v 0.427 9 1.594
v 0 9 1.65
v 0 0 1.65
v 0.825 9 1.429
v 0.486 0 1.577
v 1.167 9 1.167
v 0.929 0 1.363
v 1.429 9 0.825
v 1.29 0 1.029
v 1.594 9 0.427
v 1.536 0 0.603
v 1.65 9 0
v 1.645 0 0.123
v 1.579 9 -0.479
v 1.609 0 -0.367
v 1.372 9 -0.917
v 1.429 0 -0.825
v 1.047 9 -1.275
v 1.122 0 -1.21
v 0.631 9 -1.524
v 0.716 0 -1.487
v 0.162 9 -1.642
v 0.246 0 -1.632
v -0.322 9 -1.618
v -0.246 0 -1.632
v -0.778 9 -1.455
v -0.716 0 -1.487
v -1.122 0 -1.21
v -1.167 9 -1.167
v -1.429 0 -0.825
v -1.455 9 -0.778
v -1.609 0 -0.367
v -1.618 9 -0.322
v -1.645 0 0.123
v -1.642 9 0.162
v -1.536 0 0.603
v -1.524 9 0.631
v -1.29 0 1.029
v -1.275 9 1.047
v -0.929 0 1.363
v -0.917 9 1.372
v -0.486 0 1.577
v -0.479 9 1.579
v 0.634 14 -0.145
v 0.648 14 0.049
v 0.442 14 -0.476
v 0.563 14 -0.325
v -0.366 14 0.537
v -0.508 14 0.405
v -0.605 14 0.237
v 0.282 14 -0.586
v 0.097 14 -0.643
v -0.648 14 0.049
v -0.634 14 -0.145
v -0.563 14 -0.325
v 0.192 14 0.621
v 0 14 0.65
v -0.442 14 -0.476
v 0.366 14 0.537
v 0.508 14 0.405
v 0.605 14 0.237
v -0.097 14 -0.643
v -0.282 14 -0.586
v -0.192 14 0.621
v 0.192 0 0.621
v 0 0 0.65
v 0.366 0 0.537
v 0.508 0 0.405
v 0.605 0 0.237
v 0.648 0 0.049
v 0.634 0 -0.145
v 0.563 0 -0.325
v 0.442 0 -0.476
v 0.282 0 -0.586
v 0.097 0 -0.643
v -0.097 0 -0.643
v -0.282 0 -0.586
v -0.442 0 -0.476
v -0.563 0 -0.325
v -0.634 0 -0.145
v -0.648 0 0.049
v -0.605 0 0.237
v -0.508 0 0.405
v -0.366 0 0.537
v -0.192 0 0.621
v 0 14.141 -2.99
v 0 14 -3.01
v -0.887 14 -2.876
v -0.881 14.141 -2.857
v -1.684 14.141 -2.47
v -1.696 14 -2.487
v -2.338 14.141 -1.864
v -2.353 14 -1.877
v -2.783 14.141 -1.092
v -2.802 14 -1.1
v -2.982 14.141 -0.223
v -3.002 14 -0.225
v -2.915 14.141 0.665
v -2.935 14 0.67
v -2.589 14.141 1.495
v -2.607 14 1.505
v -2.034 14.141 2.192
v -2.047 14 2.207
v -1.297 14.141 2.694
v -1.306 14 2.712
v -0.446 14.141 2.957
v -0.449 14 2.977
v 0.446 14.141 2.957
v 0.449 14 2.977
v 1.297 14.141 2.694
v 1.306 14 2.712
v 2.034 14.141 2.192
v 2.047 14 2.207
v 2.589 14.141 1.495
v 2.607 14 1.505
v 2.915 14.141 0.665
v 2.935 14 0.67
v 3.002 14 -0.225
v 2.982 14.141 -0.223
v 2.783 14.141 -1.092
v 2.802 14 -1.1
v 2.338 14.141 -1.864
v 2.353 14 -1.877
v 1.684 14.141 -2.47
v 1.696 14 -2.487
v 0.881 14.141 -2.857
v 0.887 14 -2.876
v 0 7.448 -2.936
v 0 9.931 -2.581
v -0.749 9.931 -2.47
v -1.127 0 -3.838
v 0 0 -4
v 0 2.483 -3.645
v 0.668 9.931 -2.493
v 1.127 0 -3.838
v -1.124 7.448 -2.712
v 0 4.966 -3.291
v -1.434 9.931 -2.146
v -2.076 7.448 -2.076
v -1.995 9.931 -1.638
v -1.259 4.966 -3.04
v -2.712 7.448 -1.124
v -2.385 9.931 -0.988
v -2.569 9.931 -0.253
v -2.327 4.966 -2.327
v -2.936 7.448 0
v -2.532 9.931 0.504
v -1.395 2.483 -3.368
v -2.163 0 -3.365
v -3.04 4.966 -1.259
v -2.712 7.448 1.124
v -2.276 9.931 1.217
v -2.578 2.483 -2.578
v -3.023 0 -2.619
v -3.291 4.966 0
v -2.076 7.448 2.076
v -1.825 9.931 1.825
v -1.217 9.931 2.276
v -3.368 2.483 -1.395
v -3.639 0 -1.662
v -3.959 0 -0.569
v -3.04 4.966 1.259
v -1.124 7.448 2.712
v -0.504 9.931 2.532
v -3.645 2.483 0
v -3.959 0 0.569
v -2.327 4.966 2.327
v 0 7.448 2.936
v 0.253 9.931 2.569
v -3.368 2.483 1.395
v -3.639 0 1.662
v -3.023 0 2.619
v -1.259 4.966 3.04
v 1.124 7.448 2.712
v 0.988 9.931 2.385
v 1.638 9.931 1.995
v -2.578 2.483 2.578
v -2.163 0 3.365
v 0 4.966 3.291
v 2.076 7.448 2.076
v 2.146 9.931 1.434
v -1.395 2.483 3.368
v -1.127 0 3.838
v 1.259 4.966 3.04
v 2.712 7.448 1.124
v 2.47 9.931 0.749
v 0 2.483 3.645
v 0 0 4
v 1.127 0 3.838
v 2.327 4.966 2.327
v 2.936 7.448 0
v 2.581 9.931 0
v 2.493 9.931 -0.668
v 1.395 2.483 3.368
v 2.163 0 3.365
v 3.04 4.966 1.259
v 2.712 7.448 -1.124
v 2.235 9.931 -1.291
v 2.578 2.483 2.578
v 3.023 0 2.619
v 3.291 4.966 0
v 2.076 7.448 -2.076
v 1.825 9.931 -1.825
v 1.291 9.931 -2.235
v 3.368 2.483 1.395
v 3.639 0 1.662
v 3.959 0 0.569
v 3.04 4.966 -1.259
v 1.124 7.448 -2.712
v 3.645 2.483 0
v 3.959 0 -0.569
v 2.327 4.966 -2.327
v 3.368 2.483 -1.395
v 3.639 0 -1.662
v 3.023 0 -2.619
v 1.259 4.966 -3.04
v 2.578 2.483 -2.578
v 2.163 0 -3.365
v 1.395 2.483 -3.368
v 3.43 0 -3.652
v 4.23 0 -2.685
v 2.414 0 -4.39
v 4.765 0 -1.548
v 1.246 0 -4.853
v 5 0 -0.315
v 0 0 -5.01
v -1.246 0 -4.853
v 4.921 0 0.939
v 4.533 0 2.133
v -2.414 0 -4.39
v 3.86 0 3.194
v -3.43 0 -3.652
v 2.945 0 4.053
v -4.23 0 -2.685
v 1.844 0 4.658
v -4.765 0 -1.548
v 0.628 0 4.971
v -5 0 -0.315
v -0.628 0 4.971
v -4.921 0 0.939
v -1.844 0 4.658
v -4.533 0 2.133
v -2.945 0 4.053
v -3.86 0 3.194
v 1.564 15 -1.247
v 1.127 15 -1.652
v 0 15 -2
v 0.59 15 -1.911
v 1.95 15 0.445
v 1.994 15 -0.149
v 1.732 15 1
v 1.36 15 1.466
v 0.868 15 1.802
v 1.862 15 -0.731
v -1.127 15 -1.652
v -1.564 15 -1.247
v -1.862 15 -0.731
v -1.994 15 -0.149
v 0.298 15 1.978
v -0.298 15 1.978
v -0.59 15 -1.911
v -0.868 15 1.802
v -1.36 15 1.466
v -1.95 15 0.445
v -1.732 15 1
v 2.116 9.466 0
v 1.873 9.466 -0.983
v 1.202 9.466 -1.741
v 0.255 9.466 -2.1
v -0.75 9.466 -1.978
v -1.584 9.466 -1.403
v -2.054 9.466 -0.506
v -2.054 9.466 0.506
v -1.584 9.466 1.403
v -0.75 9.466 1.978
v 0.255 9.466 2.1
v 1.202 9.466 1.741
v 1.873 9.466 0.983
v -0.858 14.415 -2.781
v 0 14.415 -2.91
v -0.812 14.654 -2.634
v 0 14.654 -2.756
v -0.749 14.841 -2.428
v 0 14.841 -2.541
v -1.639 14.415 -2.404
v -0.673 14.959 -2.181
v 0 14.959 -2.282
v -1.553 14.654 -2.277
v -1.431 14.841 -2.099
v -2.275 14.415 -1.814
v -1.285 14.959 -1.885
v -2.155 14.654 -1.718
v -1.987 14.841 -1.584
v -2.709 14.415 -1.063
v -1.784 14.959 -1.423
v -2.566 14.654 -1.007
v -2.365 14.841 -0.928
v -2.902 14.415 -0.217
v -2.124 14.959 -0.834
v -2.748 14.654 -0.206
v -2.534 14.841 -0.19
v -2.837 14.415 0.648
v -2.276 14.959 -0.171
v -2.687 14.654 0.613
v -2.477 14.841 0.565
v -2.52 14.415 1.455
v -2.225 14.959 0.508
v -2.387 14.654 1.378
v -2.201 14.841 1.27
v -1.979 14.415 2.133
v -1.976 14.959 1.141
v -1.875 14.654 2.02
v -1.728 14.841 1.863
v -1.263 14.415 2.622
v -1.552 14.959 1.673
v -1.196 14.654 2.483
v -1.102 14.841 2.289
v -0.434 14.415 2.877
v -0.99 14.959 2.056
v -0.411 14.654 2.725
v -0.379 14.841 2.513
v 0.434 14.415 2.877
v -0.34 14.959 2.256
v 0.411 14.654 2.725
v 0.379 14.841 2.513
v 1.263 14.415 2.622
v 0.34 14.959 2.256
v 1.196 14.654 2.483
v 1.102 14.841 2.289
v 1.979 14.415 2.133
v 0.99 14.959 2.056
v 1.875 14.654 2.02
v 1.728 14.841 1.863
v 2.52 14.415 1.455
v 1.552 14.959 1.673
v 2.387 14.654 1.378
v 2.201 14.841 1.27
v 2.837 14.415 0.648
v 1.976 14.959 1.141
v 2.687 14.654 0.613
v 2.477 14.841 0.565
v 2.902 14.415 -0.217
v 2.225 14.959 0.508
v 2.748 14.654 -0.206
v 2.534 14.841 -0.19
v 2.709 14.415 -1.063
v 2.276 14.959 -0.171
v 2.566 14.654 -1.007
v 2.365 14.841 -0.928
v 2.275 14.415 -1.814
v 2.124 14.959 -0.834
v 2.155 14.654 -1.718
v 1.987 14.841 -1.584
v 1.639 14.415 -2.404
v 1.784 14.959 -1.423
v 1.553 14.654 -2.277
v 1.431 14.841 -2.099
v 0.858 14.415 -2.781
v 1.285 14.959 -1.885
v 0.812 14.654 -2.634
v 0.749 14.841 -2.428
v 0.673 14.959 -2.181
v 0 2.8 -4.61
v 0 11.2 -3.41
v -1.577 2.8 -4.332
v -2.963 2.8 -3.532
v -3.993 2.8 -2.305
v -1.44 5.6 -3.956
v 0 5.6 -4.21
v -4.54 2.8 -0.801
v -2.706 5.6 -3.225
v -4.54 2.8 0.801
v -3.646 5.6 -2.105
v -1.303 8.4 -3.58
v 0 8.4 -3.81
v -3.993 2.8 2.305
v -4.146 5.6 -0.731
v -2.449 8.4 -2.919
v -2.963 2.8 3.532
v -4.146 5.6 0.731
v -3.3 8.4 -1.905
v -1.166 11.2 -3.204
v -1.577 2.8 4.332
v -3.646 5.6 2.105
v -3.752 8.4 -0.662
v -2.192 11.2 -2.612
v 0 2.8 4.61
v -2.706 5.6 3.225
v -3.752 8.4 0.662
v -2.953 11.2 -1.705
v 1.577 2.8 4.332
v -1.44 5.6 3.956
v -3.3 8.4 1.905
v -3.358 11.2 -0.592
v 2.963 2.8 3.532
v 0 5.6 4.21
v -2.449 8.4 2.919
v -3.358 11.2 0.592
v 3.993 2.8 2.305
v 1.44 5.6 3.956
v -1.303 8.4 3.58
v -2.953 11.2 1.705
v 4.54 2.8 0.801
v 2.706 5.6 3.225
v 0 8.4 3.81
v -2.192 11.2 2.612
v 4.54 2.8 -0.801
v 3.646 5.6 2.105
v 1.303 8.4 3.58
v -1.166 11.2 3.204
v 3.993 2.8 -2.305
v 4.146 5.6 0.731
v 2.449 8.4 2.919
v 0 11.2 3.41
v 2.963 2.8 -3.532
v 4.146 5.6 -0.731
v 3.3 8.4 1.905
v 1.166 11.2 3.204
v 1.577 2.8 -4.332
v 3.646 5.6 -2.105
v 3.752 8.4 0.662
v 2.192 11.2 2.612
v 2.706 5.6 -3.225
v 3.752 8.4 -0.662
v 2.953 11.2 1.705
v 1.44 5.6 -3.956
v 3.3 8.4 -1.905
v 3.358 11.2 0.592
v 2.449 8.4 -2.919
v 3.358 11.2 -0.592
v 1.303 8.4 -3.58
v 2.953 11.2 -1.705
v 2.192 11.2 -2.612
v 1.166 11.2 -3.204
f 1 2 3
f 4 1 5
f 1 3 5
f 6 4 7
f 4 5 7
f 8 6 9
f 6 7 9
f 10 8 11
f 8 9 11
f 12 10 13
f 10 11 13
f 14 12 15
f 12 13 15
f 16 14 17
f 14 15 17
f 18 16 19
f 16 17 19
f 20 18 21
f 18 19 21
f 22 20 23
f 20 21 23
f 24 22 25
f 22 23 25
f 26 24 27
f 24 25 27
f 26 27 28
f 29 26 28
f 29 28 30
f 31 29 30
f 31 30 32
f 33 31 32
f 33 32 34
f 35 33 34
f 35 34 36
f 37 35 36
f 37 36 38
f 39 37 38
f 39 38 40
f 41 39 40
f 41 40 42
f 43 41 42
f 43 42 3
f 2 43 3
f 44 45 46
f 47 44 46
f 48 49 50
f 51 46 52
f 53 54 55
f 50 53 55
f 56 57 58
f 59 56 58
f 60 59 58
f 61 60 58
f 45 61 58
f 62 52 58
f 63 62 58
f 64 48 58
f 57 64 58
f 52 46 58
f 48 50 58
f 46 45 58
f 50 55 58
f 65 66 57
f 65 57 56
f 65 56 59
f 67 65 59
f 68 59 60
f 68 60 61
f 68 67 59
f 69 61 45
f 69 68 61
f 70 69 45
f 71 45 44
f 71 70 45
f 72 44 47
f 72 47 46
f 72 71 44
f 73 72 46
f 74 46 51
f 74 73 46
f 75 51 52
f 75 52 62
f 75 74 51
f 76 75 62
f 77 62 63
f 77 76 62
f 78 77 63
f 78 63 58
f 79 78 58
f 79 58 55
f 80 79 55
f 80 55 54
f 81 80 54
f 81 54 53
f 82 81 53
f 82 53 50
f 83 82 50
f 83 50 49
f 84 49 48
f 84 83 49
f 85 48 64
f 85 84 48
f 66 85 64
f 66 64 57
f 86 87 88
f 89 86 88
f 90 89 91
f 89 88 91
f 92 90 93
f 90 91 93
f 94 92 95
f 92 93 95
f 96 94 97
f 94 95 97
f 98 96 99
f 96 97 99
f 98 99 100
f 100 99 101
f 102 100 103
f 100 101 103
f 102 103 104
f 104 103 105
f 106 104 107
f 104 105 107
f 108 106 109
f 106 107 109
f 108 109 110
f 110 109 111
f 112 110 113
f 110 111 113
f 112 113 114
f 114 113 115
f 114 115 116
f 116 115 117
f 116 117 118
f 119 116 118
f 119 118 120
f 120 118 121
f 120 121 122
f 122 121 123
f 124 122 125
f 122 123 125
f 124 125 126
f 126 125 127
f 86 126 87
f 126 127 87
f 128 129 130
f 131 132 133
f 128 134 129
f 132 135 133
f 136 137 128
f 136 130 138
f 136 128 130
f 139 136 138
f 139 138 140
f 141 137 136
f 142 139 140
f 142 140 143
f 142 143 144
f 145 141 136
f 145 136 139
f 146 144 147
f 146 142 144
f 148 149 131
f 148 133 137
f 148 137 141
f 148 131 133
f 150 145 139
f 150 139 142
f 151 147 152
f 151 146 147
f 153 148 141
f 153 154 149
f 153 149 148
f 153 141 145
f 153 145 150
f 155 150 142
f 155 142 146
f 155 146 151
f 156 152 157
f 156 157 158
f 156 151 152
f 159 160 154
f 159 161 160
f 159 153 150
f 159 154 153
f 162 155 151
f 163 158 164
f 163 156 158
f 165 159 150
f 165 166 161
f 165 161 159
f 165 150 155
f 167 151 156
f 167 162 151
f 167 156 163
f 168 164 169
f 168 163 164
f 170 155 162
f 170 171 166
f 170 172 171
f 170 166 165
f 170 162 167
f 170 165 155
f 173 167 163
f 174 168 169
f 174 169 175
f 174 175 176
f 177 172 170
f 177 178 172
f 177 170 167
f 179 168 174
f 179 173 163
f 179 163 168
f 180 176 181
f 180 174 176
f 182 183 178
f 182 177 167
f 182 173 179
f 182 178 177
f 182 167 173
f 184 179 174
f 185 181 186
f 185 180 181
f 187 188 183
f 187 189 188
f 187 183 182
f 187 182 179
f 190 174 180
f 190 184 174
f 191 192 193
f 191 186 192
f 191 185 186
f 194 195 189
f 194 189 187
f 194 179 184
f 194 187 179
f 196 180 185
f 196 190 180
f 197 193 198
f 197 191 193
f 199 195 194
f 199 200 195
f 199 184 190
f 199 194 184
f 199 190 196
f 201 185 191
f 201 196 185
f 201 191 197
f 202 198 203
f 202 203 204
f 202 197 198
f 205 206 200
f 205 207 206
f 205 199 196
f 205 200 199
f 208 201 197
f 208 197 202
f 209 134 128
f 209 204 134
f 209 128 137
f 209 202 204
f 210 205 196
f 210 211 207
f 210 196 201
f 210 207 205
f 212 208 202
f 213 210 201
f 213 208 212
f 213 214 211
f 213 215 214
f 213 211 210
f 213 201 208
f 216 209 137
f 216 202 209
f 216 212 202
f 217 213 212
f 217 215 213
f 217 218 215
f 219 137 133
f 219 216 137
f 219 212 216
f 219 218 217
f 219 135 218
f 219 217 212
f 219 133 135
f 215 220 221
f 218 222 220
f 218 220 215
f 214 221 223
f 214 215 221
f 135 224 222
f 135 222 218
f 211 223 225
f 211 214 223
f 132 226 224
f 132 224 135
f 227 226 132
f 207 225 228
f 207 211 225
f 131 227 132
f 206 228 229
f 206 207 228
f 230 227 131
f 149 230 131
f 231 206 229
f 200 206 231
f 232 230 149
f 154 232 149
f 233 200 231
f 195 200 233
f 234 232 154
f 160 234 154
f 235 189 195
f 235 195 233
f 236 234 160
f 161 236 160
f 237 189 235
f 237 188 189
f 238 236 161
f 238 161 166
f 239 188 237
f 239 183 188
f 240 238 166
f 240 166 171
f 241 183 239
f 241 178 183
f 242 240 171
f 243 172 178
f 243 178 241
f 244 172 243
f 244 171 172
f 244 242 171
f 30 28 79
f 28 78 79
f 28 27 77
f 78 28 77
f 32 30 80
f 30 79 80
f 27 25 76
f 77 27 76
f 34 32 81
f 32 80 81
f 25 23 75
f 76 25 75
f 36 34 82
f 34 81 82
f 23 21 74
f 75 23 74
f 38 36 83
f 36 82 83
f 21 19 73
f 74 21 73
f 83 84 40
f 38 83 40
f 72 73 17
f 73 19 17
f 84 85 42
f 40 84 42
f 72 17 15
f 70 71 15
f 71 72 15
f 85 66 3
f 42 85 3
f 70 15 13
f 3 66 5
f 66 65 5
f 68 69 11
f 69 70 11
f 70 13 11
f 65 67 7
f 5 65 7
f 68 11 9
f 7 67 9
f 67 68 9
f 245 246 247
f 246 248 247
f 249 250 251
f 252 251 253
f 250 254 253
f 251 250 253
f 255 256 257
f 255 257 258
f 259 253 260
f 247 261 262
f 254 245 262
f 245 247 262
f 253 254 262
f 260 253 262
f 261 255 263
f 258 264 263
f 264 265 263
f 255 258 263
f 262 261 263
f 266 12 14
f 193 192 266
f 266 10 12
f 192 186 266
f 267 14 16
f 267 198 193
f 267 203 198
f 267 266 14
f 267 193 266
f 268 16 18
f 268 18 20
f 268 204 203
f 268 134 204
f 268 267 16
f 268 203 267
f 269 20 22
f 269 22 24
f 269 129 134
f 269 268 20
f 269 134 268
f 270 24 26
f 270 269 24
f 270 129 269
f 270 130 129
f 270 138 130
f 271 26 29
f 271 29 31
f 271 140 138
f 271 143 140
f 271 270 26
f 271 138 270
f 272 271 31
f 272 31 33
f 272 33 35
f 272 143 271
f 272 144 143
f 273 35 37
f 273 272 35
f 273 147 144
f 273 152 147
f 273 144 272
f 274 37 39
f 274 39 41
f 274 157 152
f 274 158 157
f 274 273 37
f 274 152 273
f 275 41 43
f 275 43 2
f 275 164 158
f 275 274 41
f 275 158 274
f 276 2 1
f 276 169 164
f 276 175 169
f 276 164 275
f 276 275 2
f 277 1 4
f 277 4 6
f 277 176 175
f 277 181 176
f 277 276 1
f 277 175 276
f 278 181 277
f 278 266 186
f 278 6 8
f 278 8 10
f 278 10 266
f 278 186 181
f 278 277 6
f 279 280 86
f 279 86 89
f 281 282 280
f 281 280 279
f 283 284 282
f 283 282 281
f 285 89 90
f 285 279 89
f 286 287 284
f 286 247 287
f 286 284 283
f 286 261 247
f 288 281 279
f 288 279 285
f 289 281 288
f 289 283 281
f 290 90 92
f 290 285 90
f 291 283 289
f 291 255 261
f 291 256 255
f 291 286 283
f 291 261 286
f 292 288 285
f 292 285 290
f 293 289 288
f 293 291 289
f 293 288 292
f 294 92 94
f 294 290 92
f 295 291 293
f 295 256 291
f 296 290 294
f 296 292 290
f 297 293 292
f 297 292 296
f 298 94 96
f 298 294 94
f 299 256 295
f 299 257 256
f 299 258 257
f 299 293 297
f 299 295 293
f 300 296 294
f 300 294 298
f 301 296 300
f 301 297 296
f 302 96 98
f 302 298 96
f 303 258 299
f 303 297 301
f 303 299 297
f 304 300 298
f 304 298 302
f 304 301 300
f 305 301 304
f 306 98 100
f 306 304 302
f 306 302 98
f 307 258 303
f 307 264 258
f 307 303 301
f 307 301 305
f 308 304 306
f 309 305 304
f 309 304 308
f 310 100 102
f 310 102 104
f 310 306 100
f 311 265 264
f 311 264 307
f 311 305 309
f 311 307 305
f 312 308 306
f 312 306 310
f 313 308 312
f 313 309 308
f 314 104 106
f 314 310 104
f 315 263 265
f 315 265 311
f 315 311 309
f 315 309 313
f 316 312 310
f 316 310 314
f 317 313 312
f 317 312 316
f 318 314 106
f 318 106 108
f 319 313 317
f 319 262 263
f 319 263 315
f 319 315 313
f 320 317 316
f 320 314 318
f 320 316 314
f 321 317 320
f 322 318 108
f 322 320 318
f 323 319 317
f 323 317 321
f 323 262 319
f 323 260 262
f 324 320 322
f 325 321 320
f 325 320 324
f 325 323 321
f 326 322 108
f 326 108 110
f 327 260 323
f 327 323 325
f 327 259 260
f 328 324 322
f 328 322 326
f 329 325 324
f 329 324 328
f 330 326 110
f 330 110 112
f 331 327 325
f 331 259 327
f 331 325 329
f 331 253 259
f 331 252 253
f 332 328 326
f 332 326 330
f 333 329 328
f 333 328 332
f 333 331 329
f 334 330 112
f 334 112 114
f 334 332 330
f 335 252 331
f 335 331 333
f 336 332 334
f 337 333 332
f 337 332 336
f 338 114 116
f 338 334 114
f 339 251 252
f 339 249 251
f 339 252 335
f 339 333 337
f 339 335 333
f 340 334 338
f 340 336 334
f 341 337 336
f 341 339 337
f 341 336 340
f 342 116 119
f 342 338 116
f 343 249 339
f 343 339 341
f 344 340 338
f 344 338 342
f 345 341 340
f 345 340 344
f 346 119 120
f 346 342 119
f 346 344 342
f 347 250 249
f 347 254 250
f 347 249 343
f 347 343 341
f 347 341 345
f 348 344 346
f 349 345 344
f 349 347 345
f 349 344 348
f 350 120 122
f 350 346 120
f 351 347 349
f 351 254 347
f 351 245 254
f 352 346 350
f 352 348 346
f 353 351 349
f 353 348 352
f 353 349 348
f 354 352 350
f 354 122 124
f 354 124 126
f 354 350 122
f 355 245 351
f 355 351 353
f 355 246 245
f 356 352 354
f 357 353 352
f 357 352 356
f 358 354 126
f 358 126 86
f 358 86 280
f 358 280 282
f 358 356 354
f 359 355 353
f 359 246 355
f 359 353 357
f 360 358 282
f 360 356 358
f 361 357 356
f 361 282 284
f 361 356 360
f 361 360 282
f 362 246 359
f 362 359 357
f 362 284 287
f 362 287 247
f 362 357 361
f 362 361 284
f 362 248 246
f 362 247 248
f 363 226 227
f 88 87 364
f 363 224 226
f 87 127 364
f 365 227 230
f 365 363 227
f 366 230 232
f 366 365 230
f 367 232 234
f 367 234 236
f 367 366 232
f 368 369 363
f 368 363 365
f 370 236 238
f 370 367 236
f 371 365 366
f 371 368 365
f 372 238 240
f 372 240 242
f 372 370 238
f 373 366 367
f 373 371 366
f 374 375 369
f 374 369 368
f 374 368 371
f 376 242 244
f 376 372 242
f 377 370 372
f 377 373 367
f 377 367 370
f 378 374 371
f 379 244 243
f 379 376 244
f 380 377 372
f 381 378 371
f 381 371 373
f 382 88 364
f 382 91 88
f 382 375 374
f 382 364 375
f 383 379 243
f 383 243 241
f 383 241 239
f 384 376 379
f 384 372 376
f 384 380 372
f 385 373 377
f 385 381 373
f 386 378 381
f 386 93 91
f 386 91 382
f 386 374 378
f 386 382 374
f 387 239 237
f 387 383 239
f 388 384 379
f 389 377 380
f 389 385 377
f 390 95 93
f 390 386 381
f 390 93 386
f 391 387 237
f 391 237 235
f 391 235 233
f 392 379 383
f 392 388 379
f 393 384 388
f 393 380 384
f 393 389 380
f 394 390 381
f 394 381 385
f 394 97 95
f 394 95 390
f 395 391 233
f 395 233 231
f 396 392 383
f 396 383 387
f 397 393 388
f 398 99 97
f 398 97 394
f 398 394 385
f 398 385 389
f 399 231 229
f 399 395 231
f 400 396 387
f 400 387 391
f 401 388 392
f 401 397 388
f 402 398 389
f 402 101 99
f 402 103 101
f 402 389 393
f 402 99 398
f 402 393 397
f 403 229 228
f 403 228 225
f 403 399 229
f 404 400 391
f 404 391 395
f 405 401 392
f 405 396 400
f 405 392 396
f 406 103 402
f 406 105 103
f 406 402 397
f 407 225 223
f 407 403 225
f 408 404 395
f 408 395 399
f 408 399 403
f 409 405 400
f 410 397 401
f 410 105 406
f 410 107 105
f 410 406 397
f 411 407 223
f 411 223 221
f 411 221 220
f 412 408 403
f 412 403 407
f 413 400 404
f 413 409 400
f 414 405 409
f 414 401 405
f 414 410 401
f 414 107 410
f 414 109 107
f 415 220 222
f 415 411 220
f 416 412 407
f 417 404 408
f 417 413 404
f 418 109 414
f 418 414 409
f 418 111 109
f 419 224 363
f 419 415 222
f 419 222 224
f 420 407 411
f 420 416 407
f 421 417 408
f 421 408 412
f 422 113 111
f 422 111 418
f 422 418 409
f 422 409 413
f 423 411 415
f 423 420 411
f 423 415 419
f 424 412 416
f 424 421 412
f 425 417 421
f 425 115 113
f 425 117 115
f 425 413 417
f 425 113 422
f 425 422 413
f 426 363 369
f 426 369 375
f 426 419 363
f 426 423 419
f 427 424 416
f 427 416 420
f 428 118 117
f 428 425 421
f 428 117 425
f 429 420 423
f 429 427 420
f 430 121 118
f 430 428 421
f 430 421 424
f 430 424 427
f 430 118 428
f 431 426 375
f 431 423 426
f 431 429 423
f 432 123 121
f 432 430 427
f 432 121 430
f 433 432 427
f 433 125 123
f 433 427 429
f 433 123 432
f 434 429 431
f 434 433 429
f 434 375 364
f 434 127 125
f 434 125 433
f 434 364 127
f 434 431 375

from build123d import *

# Parameters (mm, degrees)
SKETCH2_R           = 1.65
SKETCH2_R_2         = 0.65
BOSS_EXTRUDE1_DEPTH = 14
FILLET1_R           = 1


with BuildPart() as part:
    # Sketch2 → Boss-Extrude1 (new body)
    with BuildSketch(Plane(origin=(0, 0, 0), x_dir=(1, 0, 0), z_dir=(0, 1, 0))):
        with Locations(Location((0, 0, 0), (0, 0, 270))):
            Circle(SKETCH2_R)
        with Locations(Location((0, 0, 0), (0, 0, 270))):
            Circle(SKETCH2_R_2, mode=Mode.SUBTRACT)
    extrude(amount=BOSS_EXTRUDE1_DEPTH)

    # Sketch4 → Revolve1 (revolve)
    with BuildSketch(Plane.XY, mode=Mode.PRIVATE) as revolve1_sk:
        Polygon((2, 14), (4, 0), (5.010152545, 0), (3.010152545, 14), align=None)
        Polygon((2.867295402, 15), (3.010152545, 14), (0, 14), (0, 15), align=None)
    revolve(revolve1_sk.sketch.rotate(Axis((0, 0, 0), (0, 1, 0)), 90), axis=Axis((0, 0, 0), (0, 1, 0)))

    # Chamfer1: read off the stored shape, not the designer's step
    # Chamfer1 outline → Chamfer1 (revolve)
    with BuildSketch(Plane.XY):
        Polygon((1.65, 9), (2.58125, 9.93125), (2.58125, 14), (1.65, 14), align=None)
    revolve(axis=Axis((0, 0, 0), (0, 1, 0)))

    # Fillet1
    fillet1_edges = [part.edges().sort_by_distance(p)[0] for p in [
        (0, 15, 2.867295402),
    ]]
    fillet(fillet1_edges, radius=FILLET1_R)


solid = part.part
